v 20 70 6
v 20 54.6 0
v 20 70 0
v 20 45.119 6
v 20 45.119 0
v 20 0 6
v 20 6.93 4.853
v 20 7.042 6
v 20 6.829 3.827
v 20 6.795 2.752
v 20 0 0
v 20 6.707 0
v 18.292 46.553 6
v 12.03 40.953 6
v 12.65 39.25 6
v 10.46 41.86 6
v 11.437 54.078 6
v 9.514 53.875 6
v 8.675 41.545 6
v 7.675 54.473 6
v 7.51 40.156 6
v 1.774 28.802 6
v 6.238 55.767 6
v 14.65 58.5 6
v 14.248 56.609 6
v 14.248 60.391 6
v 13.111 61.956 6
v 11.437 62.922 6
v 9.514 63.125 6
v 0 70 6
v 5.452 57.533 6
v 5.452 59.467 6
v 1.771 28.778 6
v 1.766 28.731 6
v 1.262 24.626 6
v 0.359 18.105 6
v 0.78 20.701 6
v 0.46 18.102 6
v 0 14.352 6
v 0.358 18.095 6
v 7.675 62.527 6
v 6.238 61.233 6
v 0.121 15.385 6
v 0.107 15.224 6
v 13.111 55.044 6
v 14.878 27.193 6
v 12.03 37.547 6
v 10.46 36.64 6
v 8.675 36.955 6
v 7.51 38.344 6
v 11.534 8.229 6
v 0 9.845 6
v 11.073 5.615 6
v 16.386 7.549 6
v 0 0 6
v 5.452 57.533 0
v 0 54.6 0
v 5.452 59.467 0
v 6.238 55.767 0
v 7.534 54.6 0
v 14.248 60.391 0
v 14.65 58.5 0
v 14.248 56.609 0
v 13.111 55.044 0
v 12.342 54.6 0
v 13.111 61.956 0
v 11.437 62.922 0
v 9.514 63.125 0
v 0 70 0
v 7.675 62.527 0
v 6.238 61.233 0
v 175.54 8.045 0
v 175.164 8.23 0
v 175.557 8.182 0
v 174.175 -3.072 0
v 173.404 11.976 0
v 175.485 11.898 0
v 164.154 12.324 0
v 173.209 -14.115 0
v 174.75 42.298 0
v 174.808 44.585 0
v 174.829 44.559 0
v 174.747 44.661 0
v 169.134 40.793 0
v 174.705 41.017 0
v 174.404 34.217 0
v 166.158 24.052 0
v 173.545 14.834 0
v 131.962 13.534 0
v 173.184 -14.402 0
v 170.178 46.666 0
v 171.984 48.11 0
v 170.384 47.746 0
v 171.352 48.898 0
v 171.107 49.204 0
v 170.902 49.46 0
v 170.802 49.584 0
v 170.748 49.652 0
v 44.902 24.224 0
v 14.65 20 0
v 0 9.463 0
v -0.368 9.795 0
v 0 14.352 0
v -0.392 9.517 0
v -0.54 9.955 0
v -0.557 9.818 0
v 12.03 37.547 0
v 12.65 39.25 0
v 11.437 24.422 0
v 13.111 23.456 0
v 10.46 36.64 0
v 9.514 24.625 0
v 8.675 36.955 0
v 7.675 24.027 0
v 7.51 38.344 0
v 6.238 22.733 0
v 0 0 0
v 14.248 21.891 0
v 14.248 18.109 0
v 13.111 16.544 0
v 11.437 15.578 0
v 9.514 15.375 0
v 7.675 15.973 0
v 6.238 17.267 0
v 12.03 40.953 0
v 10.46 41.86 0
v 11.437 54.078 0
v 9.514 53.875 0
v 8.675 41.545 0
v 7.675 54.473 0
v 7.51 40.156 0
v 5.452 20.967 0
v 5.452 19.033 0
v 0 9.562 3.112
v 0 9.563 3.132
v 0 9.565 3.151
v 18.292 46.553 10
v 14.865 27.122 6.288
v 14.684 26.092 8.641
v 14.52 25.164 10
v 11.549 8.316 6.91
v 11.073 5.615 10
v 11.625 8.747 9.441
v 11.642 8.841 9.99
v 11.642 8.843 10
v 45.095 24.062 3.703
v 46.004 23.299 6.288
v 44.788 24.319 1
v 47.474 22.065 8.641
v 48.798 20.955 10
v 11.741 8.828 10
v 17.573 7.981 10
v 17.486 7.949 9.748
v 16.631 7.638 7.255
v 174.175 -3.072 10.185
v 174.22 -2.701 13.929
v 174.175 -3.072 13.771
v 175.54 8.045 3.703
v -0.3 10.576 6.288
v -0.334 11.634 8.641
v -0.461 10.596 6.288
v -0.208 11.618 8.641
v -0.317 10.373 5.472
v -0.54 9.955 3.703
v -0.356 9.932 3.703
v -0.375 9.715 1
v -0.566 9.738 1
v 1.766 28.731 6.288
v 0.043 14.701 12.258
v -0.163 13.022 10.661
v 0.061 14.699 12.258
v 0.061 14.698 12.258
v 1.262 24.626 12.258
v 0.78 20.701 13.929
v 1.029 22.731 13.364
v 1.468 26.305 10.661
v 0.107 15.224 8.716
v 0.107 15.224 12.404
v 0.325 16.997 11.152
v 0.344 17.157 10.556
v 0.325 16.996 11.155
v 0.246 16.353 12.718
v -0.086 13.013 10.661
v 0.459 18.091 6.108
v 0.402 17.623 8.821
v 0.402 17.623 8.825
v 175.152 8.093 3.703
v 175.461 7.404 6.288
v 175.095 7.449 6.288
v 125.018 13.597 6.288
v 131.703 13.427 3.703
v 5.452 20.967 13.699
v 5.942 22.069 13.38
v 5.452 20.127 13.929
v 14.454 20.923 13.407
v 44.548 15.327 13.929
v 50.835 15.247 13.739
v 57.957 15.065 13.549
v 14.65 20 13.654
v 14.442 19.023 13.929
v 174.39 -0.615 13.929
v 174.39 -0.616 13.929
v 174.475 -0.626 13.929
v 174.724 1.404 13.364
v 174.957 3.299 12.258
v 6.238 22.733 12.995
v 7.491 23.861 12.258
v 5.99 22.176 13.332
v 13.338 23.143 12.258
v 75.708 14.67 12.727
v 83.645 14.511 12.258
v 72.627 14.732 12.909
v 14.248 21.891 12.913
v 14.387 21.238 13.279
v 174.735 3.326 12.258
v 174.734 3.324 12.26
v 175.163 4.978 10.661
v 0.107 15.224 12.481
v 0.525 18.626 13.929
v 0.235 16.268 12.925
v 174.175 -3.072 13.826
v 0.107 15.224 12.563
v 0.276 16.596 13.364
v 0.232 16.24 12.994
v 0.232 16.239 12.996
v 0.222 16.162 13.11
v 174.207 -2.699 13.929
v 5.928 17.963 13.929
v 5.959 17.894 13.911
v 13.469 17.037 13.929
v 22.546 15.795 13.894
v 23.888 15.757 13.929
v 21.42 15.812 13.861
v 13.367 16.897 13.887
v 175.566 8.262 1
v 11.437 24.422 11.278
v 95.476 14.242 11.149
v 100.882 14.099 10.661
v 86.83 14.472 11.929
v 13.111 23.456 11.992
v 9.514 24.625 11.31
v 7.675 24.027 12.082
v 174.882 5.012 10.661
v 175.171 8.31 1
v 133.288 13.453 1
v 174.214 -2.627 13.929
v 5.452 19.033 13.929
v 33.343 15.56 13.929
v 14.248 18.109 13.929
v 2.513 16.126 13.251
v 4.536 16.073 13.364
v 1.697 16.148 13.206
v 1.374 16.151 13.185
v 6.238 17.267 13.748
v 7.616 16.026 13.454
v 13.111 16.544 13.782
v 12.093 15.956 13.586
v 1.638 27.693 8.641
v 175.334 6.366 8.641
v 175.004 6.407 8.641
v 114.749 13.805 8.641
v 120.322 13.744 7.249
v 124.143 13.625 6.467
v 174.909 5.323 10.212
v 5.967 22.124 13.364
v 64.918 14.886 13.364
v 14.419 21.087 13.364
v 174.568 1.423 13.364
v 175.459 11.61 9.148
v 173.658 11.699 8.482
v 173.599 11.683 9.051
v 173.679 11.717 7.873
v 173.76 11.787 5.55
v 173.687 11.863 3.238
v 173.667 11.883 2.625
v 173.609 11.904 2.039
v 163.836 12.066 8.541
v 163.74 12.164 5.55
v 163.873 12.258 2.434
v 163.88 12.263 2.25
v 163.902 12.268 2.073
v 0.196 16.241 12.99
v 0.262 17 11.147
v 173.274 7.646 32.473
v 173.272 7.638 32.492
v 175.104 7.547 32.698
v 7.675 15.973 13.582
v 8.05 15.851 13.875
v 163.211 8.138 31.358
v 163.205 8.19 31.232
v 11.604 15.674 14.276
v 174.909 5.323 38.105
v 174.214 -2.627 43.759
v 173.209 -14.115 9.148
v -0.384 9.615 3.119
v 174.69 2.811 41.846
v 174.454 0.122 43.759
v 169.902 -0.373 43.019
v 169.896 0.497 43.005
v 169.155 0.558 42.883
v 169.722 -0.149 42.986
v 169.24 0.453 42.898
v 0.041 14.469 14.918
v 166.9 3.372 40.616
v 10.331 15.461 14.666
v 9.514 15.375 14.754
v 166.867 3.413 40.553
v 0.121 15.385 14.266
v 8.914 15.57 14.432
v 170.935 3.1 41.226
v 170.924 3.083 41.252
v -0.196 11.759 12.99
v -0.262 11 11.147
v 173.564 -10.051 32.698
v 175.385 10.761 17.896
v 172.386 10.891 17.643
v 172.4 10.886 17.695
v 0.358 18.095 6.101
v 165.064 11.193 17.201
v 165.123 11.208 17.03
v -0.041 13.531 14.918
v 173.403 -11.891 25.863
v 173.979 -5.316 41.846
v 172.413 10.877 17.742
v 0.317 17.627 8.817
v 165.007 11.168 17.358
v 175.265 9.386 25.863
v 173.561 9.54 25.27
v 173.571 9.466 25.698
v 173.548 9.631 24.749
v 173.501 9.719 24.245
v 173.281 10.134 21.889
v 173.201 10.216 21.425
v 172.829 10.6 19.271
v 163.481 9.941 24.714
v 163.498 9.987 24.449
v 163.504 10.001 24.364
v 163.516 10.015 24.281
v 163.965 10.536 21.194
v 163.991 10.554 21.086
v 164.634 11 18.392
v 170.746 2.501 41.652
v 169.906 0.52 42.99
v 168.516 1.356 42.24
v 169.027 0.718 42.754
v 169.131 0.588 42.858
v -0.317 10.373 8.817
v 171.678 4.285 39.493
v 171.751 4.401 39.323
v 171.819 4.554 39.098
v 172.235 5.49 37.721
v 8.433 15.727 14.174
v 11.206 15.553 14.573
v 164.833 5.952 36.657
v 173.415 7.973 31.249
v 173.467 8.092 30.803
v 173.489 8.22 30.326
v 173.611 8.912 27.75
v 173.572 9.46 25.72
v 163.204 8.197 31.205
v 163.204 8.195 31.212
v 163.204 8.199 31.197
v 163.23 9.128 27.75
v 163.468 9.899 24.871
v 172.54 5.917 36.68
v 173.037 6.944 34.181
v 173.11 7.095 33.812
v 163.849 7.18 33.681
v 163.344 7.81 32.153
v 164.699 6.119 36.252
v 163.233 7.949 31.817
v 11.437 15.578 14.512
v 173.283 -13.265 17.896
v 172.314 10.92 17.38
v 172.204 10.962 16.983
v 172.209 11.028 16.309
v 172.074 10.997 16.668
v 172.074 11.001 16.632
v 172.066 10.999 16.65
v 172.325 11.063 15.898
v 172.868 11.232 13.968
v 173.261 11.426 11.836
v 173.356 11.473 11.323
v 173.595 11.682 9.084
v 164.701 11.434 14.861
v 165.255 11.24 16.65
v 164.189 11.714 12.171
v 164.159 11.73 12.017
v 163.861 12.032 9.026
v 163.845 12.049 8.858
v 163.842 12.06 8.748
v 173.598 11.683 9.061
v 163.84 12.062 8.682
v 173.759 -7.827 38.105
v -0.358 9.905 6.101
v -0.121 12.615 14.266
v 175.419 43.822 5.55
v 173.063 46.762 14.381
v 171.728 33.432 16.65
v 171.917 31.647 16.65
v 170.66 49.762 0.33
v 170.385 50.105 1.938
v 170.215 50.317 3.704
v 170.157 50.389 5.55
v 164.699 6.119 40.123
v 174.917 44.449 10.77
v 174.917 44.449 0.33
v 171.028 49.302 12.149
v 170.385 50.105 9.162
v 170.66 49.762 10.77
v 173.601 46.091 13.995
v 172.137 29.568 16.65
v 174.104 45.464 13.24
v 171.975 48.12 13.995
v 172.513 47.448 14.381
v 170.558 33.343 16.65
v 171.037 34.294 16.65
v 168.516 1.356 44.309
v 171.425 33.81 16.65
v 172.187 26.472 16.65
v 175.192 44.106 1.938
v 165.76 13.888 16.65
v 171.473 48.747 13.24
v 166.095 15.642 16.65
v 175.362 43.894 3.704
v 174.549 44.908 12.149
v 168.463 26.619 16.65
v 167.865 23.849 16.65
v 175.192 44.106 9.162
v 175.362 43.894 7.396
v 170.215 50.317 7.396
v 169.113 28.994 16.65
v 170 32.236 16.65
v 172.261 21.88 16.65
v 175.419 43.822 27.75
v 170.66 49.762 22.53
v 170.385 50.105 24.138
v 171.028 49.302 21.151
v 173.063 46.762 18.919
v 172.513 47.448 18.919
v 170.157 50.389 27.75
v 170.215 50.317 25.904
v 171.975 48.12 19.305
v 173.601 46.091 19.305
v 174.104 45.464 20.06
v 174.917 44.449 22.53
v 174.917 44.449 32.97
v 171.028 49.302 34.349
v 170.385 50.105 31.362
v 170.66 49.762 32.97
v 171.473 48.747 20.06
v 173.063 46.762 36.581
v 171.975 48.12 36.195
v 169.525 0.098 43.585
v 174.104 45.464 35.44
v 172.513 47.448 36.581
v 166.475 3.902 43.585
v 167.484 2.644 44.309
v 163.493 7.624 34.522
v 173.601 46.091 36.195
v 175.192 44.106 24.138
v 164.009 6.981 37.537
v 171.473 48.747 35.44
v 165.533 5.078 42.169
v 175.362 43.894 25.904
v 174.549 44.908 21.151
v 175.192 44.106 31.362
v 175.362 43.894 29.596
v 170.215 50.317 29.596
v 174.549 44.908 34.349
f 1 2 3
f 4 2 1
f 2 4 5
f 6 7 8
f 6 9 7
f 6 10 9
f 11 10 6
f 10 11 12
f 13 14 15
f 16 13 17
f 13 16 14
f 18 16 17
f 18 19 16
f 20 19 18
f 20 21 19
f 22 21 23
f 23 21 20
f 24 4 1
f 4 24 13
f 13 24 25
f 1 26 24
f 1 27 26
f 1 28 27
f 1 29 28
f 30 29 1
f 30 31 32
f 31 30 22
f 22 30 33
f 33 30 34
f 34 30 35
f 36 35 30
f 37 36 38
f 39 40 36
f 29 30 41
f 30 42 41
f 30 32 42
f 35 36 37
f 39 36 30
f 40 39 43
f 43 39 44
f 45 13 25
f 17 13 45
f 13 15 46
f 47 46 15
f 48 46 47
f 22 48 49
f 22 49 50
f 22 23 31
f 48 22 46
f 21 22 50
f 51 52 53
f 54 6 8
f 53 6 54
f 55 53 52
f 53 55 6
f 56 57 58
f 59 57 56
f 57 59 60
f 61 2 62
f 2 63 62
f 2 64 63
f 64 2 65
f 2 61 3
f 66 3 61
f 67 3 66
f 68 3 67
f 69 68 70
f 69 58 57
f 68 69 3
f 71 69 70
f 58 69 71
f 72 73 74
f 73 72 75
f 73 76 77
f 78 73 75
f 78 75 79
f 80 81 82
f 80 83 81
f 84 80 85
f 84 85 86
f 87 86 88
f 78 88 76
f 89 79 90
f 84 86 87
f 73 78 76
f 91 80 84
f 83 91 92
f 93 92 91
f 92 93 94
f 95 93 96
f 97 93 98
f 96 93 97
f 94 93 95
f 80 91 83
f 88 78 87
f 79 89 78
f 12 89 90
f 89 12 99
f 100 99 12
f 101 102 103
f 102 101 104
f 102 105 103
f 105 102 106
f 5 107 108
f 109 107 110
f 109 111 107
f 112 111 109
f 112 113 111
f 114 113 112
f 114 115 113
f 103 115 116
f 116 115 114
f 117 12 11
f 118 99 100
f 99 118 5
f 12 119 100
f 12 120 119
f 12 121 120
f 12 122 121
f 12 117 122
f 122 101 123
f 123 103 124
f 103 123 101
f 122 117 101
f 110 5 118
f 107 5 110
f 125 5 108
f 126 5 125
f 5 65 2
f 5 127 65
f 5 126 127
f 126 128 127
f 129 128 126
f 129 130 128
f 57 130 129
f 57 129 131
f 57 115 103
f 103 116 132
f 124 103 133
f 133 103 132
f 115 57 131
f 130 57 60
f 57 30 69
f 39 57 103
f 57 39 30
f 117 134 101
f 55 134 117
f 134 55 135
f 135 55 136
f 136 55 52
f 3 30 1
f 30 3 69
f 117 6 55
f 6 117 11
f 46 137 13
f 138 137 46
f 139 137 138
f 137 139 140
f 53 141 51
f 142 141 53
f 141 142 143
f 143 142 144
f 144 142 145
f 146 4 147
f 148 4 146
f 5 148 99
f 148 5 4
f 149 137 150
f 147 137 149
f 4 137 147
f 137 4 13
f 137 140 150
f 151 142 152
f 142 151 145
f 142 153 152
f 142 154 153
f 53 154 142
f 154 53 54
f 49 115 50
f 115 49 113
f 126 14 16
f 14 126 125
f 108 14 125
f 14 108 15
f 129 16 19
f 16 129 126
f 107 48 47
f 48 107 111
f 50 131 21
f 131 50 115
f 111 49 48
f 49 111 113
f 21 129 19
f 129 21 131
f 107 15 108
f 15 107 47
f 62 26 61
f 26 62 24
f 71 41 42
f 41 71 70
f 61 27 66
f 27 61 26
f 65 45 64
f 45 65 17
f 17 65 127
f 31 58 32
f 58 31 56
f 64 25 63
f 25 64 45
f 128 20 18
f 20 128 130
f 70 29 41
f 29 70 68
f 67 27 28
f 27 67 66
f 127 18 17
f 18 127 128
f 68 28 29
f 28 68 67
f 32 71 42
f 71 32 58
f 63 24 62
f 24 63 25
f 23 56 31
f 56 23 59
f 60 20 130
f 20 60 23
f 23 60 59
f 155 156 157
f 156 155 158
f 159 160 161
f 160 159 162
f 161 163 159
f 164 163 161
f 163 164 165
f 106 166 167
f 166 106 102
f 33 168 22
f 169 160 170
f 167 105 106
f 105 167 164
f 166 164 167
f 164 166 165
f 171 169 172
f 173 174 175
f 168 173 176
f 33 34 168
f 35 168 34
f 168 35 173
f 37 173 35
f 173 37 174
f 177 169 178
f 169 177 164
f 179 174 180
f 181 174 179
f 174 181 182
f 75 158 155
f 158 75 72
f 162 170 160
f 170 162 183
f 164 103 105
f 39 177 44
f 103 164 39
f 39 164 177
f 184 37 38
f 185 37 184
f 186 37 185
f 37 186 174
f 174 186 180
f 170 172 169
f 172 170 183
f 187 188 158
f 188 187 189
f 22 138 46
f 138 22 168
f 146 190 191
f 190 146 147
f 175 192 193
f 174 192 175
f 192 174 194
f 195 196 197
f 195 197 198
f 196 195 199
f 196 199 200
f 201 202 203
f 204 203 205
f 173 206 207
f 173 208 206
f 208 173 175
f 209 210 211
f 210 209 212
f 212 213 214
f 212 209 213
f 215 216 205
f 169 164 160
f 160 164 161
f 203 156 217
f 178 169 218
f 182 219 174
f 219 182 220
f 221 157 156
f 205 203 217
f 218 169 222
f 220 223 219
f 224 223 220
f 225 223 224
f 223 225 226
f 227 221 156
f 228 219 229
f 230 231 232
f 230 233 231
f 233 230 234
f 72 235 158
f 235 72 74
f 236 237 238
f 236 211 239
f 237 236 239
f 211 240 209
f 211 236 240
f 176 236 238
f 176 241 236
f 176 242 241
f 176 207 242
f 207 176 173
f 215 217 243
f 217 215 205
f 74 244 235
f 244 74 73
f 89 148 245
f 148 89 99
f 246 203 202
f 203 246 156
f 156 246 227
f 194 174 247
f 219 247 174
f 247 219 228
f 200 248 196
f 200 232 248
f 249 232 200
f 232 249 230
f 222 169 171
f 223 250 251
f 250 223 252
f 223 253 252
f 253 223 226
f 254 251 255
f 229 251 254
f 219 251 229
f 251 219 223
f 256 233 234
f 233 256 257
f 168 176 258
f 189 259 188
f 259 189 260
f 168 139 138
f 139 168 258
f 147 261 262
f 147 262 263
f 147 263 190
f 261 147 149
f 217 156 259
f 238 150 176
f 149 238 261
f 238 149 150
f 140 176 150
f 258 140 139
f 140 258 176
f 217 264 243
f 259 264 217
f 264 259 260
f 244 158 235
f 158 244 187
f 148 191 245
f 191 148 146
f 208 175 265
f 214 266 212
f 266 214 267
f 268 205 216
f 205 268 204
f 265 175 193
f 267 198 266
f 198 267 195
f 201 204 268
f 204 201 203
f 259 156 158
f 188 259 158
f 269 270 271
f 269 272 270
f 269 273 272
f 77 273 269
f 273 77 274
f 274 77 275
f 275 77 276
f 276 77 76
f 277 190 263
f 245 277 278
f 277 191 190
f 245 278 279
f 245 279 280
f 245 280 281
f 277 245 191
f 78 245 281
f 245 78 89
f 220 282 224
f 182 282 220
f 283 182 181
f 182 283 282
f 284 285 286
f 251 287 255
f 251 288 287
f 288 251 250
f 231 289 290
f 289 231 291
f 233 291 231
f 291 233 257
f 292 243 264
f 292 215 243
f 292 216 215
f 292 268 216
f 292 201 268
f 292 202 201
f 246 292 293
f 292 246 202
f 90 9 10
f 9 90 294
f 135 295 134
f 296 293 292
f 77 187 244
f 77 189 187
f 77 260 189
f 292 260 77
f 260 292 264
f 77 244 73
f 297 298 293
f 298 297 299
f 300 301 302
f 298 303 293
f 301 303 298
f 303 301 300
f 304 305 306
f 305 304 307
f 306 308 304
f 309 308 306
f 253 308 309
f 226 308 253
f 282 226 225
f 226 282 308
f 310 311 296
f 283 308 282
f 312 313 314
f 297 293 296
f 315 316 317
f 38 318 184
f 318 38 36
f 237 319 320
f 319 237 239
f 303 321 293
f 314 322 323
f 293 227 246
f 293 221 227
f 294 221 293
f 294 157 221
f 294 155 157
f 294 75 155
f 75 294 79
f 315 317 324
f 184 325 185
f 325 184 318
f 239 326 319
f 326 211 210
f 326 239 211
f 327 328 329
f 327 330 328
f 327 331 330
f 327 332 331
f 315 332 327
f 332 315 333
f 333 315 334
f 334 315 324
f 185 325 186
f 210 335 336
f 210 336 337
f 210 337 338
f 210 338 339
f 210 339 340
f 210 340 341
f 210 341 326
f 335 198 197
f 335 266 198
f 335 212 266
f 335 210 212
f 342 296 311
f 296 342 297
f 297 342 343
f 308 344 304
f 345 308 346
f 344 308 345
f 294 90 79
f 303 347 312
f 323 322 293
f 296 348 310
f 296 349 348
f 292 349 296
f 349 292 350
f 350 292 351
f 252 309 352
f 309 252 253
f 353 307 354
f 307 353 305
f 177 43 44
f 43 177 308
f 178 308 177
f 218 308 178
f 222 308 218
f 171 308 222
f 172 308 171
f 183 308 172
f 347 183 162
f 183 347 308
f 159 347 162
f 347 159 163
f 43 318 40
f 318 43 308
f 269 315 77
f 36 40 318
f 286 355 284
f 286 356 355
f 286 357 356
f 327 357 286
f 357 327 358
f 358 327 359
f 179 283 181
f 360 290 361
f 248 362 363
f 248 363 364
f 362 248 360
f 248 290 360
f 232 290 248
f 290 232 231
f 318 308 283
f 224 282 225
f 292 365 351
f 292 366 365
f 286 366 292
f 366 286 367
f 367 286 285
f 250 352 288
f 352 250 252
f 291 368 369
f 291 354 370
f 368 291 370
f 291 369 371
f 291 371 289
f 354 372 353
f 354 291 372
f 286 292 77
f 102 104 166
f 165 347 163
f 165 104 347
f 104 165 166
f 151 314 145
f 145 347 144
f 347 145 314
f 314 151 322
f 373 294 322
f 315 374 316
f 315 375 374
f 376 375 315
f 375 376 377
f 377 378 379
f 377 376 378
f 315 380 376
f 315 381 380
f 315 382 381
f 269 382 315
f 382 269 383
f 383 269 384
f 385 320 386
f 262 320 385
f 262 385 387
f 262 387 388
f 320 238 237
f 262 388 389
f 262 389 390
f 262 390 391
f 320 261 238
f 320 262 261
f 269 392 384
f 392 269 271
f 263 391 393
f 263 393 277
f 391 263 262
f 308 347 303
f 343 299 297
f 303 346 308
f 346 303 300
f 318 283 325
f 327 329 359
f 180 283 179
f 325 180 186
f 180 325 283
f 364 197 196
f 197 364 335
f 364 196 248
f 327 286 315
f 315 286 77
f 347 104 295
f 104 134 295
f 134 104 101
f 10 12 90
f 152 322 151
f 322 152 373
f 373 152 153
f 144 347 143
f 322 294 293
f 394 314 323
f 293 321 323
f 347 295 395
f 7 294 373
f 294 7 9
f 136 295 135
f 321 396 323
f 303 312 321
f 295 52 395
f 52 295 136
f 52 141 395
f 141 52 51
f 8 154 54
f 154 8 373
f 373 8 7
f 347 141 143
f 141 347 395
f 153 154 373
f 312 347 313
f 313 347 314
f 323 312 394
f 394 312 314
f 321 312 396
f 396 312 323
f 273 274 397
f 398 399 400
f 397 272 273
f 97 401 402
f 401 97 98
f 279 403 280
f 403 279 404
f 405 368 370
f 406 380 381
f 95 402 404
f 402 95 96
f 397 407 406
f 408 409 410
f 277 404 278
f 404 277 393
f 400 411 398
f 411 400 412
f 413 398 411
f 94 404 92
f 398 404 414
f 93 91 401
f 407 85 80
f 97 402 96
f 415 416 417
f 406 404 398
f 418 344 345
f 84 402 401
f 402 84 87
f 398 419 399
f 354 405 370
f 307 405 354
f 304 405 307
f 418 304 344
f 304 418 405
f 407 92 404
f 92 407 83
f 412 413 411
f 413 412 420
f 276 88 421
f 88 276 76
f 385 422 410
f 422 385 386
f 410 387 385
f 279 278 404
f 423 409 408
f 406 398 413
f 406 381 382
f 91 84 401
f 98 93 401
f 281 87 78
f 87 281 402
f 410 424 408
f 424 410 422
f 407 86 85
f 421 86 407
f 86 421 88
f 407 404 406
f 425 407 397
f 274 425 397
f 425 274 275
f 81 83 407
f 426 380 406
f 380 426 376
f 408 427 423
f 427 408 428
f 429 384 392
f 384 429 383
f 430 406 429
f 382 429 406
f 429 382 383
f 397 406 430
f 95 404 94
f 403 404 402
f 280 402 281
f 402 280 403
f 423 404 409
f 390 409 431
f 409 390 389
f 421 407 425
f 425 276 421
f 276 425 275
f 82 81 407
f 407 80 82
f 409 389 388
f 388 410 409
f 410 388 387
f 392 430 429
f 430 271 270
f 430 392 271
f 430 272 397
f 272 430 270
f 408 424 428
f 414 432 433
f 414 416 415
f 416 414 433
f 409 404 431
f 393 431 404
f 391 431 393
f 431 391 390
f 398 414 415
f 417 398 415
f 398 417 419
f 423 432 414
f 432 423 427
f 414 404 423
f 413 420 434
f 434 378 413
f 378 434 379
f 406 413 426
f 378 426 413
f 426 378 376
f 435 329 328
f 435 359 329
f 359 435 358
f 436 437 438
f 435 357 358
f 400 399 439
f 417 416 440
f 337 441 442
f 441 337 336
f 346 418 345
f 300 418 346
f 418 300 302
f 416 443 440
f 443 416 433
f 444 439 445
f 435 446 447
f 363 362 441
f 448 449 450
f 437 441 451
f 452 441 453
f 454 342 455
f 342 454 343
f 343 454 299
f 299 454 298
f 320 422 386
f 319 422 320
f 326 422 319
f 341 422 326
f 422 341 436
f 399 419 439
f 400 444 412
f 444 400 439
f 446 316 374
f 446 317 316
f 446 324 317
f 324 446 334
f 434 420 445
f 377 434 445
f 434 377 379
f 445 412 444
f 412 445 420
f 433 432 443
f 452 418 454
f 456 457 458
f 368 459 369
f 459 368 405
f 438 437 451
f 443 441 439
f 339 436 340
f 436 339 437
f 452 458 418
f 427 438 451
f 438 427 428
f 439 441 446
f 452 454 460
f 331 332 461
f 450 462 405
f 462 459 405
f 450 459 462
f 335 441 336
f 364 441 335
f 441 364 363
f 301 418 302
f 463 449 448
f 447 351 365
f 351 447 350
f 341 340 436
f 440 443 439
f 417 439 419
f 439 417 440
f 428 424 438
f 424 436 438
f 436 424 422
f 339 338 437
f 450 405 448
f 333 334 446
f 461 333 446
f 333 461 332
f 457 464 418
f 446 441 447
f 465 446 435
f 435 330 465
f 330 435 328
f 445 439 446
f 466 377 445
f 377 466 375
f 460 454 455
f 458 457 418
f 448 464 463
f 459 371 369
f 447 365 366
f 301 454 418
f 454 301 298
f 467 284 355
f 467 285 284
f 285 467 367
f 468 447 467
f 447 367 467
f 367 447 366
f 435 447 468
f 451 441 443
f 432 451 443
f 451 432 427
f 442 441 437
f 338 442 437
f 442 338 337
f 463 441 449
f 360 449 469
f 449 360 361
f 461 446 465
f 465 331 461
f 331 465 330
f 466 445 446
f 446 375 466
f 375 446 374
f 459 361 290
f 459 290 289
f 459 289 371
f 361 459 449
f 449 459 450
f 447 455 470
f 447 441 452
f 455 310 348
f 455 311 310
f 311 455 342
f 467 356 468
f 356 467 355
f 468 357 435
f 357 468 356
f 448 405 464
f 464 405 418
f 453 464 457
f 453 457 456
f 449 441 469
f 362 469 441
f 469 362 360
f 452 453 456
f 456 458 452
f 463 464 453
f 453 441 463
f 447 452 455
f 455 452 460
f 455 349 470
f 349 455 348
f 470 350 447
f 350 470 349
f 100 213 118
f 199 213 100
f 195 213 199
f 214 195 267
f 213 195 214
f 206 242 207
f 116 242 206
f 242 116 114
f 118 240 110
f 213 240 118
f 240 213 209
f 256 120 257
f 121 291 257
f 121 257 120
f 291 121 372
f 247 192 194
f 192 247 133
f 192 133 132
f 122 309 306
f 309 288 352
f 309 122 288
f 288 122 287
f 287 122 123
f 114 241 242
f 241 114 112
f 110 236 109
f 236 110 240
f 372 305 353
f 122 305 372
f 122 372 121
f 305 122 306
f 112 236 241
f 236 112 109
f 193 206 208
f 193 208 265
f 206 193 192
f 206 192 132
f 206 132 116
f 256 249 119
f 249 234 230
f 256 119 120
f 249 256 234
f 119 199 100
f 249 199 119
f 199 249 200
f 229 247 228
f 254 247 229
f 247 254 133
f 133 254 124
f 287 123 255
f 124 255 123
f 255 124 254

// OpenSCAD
echo(version=version());
echo(" gutter cleaner by Evelyn ");
//$fa=.5; $fs=0.5;
hole=5.3/2;
thck=6;
lgth=175;  //armlength
brkwidth=20;
hgh = 55+15;


difference(){
  union(){
     bracket();
     translate([0,14,0]) rotate([-90,0,0]) union(){arm();claw();};
  }
  translate([-10,-50.50,-100.00]) cube([lgth*1.15,105.1,100]);    
  // Holes Remove     
   translate([brkwidth/2,20,0]) cylinder(h=thck*13,r=hole+2,center=true);  
}



module bracket(){
  difference(){
    union(){
      color("blue")   cube([brkwidth,hgh,thck]);  
      color("green")  translate([brkwidth+6.5,24,-thck+6]) rotate([0,0,-10]) cylinder(r=brkwidth+4,h=thck+4,$fn=3);  
      //Add Strenghts         
      translate([brkwidth/2+brkwidth/3,hgh/2,thck/2]) rotate([90,0,0]) cylinder(h=hgh,r=brkwidth/10, center=true);
      translate([brkwidth/2,hgh/2,thck/2]) rotate([90,0,0]) cylinder(h=hgh, r=brkwidth/10, center=true);
      translate([brkwidth/2-brkwidth/3,hgh/2,thck/2]) rotate([90,0,0]) cylinder(h=hgh,r =brkwidth/10, center=true);
    }
    // Holes Remove     
    translate([brkwidth/2,20,0]) cylinder(h=thck*3,r=hole+2,center=true);          
    translate([brkwidth/2,38.5/2+20,0]) cylinder(h=thck*3,r=hole,center=true);
    translate([brkwidth/2,38.5+20,0]) cylinder(h=thck*3,r=hole+2,center=true);
   } 
}

module arm(){    
  wdth = 20;
  union(){
    translate([lgth/2,-wdth/2+9,-5]) rotate([0,97,0]) scale([1,1.3,1])cylinder(h=lgth, r=wdth/2, center=true); 
    rotate([0,95,0]) scale([.3,1,1])cylinder(h=lgth,r1=wdth/4*3,r2=44);  
    }    
}

module claw(){ 
    r = 20;
    union(){
      translate([lgth,0,0]) scale([.35,1.11,1.2]){
      translate([-20,-5,-10]) rotate([0,r,0]) cylinder(h=40,r1=15, r2=8);
      translate([-20,-25,-10]) rotate([0,r,0]) cylinder(h=40,r1=15, r2=8);
      //translate([-15,-20,0])  cylinder(h=40,r1=20, r2=4);
    }
  }
}
